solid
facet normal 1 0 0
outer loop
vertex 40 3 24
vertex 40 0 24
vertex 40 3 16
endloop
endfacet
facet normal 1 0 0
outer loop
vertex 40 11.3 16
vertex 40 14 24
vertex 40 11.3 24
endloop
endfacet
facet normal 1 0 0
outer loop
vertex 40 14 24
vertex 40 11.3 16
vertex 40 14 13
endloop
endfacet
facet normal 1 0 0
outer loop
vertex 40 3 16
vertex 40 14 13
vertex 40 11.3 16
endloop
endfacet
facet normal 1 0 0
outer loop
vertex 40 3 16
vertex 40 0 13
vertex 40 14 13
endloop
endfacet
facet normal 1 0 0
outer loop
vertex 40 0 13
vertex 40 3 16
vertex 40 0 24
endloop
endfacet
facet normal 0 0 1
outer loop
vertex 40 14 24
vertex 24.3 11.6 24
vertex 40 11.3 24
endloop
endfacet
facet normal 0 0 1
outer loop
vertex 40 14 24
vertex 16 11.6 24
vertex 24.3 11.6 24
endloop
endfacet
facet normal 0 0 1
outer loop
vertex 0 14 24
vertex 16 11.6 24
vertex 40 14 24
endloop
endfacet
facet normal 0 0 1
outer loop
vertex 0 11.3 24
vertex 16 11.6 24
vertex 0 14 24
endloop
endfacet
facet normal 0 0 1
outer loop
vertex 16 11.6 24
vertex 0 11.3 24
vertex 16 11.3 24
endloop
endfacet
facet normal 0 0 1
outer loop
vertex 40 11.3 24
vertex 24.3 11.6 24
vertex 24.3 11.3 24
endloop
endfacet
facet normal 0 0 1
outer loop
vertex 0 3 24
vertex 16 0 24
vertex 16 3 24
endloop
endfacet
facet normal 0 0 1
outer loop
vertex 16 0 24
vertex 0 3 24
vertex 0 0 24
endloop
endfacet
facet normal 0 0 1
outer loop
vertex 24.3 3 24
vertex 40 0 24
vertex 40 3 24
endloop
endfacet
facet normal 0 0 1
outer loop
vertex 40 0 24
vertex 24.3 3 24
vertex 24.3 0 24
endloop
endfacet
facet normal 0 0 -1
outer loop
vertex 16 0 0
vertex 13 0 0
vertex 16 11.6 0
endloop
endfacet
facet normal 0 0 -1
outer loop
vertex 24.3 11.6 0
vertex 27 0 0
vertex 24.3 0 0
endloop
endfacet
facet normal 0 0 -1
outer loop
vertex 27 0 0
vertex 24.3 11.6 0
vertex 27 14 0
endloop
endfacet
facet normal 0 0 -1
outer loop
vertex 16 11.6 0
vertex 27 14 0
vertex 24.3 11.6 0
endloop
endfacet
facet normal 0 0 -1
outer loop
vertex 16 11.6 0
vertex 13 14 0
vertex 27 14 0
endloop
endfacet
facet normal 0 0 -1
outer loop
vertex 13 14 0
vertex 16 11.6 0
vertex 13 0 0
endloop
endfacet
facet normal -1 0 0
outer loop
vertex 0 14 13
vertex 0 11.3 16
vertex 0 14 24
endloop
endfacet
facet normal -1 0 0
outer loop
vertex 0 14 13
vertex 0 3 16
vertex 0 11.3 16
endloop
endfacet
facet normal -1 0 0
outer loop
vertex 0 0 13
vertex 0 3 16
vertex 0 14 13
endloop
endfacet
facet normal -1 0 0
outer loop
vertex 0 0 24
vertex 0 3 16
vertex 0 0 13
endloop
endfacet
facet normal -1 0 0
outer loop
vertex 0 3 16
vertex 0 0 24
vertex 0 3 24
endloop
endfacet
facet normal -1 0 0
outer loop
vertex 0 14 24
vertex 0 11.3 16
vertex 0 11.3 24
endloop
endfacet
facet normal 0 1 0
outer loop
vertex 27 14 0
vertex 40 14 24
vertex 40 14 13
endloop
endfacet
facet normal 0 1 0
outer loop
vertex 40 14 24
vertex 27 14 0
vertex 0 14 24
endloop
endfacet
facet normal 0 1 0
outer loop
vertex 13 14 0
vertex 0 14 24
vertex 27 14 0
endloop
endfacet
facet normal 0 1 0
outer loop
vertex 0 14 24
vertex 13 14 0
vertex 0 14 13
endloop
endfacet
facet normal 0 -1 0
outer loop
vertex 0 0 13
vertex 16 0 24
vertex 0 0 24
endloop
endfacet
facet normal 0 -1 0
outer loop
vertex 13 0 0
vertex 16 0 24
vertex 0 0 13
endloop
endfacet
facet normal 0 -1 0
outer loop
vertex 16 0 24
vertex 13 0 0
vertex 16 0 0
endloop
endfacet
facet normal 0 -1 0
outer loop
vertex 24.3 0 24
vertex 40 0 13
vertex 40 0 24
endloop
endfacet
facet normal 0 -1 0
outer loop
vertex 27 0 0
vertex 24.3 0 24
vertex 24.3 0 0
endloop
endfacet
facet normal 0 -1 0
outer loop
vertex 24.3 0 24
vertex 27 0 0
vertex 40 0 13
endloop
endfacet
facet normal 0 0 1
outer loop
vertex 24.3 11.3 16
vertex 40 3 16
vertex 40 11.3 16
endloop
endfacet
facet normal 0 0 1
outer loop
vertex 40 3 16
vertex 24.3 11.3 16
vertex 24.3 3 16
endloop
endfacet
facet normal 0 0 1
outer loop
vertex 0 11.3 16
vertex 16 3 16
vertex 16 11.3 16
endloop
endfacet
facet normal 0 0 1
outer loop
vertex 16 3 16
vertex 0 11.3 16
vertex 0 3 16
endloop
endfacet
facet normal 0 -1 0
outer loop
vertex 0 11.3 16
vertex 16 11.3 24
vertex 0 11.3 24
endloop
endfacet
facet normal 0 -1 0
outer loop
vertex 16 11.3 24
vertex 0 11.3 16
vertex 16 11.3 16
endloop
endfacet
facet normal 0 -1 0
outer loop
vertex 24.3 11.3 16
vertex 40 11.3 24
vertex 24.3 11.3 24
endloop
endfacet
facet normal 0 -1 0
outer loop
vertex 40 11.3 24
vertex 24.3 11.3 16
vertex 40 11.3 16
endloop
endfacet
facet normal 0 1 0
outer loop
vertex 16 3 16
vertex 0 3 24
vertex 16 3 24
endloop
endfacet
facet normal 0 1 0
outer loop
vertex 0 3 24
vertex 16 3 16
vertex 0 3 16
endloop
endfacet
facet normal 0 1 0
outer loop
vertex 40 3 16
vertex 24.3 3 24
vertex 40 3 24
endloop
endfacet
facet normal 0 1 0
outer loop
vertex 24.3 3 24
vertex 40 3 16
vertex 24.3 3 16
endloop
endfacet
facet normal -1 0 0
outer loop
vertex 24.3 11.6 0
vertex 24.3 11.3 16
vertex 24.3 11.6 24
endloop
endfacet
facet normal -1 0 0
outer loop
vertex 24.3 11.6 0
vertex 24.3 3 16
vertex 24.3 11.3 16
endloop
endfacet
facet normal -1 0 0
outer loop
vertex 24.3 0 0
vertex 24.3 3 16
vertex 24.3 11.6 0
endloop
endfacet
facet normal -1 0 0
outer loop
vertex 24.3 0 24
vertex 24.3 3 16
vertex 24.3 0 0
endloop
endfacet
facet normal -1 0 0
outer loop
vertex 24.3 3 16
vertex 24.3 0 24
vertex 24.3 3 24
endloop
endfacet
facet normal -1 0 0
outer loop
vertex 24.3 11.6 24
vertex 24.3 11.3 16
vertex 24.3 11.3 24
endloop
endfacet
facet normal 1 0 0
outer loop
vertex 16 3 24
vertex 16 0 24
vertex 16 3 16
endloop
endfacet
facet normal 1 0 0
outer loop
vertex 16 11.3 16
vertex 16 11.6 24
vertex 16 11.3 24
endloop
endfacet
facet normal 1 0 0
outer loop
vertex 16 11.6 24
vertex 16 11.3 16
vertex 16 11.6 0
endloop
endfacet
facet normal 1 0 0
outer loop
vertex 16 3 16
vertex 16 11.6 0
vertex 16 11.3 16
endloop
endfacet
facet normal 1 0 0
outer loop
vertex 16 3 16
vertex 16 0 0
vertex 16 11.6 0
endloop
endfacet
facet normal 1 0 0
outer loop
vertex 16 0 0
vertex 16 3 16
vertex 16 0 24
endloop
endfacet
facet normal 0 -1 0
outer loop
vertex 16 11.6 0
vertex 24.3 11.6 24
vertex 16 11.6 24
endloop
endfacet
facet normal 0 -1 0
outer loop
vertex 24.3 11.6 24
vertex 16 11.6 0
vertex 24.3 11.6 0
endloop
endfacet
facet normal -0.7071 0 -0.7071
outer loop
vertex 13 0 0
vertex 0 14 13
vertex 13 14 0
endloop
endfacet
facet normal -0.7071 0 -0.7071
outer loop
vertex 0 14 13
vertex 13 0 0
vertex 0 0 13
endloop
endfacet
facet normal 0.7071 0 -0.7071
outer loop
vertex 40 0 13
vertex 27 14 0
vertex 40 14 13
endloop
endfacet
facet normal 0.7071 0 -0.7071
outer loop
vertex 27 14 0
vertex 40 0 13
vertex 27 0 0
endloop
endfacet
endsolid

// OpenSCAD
// the most important setting: your t-stop type
// type 1: top panel and the side are level with each other; type 2: top panel protrude out front and not level with side panel as seen on the Anet A8 printer
t_corner_type = 1;

// other customizable values
// thickness of printer's top panel (not the t-stop), == top cavity width
printer_top_thickness = 8;
// same as thickness is a good default. lower to reduce material/print time and higher to add stability
t_corner_top_cavity_depth = 8;
// width of printer's side panel (not the t-stop), == side cavity width
printer_side_thickness = 8;
// same as thickness is a good default. lower to reduce material/print time and higher to add stability
t_corner_side_cavity_depth = 8;
// thickness of t-stop wall
wall_thickness = 3;
// overall size of the t-stop. normally double the thickness should be enough but you can increase size to add stability
t_corner_size = 16;
// 0.3 should be a good default for tolerance
tolerance = 0.3;

// function to calculate the base of a right triangle.
// we'll use this function to calculate how much we have to translate the cube that will cut
// into the left side of t-stop body
function right_tri_base(side1, side2)
    = sqrt(side1 * side1 + side2 * side2);

// function to calculate leg of a right triangle.
function right_tri_side(other_side, base)
    = sqrt(base * base - other_side * other_side);

// extrude a polygon from yz plane to the x axis
module polygon_yz_extrude(i_points, i_height) {
    rotate([90, 0, 90])
    linear_extrude(height = i_height, twist = 0, center = false, convexity = 0, slices = 10, scale = 1.0)
    polygon(i_points);
}

// extrude a polygon from xz plane to the y axis
module polygon_xz_extrude(i_points, i_height) {
    translate([0, i_height, 0])
    rotate([90, 0, 0])
    linear_extrude(height = i_height, twist = 0, center = false, convexity = 0, slices = 10, scale = 1.0)
    polygon(i_points);
}

if (t_corner_type == 1) {
    // auto-generate values
    t_corner_width = (t_corner_size * 2) + printer_side_thickness;
    t_corner_height = t_corner_size + t_corner_top_cavity_depth;
    t_corner_depth = printer_top_thickness + (wall_thickness * 2);
    
    difference() {
        // create t-stop body
        cube([t_corner_width, t_corner_depth, t_corner_height]);
        // cut into the body from the top to create top cavity
        translate([0, wall_thickness, t_corner_height - t_corner_top_cavity_depth])
            cube([t_corner_width, printer_top_thickness + tolerance, t_corner_top_cavity_depth]);
        // cut into the body from the front to create side cavity
        translate([t_corner_size, 0, 0])
            cube([printer_side_thickness + tolerance, t_corner_side_cavity_depth + wall_thickness + tolerance * 2, t_corner_height]);
        
        // cut into the left side at an angle to save material and make it look better
        polygon_xz_extrude([[0, 0], [0, t_corner_height - t_corner_top_cavity_depth - wall_thickness], [t_corner_size - wall_thickness, 0]], t_corner_width);
        // cut into the right side at an angle to save material and make it look better
        polygon_xz_extrude([[t_corner_width, 0], [t_corner_width - t_corner_size + wall_thickness, 0], [t_corner_width, t_corner_size - wall_thickness]], t_corner_width);
    }
}
else if (t_corner_type == 2) {
    // auto-generate values
    t_corner_width = (t_corner_size * 2) + printer_side_thickness;
    t_corner_height = t_corner_size + t_corner_top_cavity_depth;
    t_corner_depth = printer_top_thickness + wall_thickness  + printer_side_thickness;
    
    difference() {
        // create t-stop body
        cube([t_corner_width, t_corner_depth, t_corner_height]);
        // cut into the body from the top to create top cavity
        translate([0, printer_side_thickness, t_corner_height - t_corner_top_cavity_depth])
            cube([t_corner_width, printer_top_thickness + tolerance, t_corner_top_cavity_depth]);
        // cut into the body from the front to create side cavity
        translate([t_corner_size, 0, 0])
            cube([printer_side_thickness + tolerance, t_corner_side_cavity_depth + tolerance, t_corner_height]);
        
        // cut into the left side at an angle to save material and make it look better
        polygon_xz_extrude([[0, 0], [0, t_corner_height - t_corner_top_cavity_depth - wall_thickness], [t_corner_size - wall_thickness, 0]], t_corner_width);
        // cut into the right side at an angle to save material and make it look better
        polygon_xz_extrude([[t_corner_width, 0], [t_corner_width - t_corner_size + wall_thickness, 0], [t_corner_width, t_corner_size - wall_thickness]], t_corner_width);
        
        // cut the right side to save material and make it look better
        translate([t_corner_width, 0, 0])
            rotate([0, 0, 90])
            linear_extrude(height = t_corner_height, twist = 0, center = false, convexity = 0, slices = 10, scale = 1.0)
            polygon([[0, 0], [0, t_corner_size - wall_thickness], [t_corner_side_cavity_depth - wall_thickness, 0]]);
        // cut the left side to save material and make it look better
        linear_extrude(height = t_corner_height, twist = 0, center = false, convexity = 0, slices = 10, scale = 1.0)
            polygon([[0, 0], [t_corner_size - wall_thickness, 0], [0, t_corner_side_cavity_depth - wall_thickness]]);
            
        // cut a slope at the back to save material and make it look better
        polygon_yz_extrude([[t_corner_depth + tolerance, 0], [t_corner_side_cavity_depth + wall_thickness * 2, 0], [t_corner_depth, t_corner_height - t_corner_top_cavity_depth - wall_thickness]], t_corner_width);
    }
}
